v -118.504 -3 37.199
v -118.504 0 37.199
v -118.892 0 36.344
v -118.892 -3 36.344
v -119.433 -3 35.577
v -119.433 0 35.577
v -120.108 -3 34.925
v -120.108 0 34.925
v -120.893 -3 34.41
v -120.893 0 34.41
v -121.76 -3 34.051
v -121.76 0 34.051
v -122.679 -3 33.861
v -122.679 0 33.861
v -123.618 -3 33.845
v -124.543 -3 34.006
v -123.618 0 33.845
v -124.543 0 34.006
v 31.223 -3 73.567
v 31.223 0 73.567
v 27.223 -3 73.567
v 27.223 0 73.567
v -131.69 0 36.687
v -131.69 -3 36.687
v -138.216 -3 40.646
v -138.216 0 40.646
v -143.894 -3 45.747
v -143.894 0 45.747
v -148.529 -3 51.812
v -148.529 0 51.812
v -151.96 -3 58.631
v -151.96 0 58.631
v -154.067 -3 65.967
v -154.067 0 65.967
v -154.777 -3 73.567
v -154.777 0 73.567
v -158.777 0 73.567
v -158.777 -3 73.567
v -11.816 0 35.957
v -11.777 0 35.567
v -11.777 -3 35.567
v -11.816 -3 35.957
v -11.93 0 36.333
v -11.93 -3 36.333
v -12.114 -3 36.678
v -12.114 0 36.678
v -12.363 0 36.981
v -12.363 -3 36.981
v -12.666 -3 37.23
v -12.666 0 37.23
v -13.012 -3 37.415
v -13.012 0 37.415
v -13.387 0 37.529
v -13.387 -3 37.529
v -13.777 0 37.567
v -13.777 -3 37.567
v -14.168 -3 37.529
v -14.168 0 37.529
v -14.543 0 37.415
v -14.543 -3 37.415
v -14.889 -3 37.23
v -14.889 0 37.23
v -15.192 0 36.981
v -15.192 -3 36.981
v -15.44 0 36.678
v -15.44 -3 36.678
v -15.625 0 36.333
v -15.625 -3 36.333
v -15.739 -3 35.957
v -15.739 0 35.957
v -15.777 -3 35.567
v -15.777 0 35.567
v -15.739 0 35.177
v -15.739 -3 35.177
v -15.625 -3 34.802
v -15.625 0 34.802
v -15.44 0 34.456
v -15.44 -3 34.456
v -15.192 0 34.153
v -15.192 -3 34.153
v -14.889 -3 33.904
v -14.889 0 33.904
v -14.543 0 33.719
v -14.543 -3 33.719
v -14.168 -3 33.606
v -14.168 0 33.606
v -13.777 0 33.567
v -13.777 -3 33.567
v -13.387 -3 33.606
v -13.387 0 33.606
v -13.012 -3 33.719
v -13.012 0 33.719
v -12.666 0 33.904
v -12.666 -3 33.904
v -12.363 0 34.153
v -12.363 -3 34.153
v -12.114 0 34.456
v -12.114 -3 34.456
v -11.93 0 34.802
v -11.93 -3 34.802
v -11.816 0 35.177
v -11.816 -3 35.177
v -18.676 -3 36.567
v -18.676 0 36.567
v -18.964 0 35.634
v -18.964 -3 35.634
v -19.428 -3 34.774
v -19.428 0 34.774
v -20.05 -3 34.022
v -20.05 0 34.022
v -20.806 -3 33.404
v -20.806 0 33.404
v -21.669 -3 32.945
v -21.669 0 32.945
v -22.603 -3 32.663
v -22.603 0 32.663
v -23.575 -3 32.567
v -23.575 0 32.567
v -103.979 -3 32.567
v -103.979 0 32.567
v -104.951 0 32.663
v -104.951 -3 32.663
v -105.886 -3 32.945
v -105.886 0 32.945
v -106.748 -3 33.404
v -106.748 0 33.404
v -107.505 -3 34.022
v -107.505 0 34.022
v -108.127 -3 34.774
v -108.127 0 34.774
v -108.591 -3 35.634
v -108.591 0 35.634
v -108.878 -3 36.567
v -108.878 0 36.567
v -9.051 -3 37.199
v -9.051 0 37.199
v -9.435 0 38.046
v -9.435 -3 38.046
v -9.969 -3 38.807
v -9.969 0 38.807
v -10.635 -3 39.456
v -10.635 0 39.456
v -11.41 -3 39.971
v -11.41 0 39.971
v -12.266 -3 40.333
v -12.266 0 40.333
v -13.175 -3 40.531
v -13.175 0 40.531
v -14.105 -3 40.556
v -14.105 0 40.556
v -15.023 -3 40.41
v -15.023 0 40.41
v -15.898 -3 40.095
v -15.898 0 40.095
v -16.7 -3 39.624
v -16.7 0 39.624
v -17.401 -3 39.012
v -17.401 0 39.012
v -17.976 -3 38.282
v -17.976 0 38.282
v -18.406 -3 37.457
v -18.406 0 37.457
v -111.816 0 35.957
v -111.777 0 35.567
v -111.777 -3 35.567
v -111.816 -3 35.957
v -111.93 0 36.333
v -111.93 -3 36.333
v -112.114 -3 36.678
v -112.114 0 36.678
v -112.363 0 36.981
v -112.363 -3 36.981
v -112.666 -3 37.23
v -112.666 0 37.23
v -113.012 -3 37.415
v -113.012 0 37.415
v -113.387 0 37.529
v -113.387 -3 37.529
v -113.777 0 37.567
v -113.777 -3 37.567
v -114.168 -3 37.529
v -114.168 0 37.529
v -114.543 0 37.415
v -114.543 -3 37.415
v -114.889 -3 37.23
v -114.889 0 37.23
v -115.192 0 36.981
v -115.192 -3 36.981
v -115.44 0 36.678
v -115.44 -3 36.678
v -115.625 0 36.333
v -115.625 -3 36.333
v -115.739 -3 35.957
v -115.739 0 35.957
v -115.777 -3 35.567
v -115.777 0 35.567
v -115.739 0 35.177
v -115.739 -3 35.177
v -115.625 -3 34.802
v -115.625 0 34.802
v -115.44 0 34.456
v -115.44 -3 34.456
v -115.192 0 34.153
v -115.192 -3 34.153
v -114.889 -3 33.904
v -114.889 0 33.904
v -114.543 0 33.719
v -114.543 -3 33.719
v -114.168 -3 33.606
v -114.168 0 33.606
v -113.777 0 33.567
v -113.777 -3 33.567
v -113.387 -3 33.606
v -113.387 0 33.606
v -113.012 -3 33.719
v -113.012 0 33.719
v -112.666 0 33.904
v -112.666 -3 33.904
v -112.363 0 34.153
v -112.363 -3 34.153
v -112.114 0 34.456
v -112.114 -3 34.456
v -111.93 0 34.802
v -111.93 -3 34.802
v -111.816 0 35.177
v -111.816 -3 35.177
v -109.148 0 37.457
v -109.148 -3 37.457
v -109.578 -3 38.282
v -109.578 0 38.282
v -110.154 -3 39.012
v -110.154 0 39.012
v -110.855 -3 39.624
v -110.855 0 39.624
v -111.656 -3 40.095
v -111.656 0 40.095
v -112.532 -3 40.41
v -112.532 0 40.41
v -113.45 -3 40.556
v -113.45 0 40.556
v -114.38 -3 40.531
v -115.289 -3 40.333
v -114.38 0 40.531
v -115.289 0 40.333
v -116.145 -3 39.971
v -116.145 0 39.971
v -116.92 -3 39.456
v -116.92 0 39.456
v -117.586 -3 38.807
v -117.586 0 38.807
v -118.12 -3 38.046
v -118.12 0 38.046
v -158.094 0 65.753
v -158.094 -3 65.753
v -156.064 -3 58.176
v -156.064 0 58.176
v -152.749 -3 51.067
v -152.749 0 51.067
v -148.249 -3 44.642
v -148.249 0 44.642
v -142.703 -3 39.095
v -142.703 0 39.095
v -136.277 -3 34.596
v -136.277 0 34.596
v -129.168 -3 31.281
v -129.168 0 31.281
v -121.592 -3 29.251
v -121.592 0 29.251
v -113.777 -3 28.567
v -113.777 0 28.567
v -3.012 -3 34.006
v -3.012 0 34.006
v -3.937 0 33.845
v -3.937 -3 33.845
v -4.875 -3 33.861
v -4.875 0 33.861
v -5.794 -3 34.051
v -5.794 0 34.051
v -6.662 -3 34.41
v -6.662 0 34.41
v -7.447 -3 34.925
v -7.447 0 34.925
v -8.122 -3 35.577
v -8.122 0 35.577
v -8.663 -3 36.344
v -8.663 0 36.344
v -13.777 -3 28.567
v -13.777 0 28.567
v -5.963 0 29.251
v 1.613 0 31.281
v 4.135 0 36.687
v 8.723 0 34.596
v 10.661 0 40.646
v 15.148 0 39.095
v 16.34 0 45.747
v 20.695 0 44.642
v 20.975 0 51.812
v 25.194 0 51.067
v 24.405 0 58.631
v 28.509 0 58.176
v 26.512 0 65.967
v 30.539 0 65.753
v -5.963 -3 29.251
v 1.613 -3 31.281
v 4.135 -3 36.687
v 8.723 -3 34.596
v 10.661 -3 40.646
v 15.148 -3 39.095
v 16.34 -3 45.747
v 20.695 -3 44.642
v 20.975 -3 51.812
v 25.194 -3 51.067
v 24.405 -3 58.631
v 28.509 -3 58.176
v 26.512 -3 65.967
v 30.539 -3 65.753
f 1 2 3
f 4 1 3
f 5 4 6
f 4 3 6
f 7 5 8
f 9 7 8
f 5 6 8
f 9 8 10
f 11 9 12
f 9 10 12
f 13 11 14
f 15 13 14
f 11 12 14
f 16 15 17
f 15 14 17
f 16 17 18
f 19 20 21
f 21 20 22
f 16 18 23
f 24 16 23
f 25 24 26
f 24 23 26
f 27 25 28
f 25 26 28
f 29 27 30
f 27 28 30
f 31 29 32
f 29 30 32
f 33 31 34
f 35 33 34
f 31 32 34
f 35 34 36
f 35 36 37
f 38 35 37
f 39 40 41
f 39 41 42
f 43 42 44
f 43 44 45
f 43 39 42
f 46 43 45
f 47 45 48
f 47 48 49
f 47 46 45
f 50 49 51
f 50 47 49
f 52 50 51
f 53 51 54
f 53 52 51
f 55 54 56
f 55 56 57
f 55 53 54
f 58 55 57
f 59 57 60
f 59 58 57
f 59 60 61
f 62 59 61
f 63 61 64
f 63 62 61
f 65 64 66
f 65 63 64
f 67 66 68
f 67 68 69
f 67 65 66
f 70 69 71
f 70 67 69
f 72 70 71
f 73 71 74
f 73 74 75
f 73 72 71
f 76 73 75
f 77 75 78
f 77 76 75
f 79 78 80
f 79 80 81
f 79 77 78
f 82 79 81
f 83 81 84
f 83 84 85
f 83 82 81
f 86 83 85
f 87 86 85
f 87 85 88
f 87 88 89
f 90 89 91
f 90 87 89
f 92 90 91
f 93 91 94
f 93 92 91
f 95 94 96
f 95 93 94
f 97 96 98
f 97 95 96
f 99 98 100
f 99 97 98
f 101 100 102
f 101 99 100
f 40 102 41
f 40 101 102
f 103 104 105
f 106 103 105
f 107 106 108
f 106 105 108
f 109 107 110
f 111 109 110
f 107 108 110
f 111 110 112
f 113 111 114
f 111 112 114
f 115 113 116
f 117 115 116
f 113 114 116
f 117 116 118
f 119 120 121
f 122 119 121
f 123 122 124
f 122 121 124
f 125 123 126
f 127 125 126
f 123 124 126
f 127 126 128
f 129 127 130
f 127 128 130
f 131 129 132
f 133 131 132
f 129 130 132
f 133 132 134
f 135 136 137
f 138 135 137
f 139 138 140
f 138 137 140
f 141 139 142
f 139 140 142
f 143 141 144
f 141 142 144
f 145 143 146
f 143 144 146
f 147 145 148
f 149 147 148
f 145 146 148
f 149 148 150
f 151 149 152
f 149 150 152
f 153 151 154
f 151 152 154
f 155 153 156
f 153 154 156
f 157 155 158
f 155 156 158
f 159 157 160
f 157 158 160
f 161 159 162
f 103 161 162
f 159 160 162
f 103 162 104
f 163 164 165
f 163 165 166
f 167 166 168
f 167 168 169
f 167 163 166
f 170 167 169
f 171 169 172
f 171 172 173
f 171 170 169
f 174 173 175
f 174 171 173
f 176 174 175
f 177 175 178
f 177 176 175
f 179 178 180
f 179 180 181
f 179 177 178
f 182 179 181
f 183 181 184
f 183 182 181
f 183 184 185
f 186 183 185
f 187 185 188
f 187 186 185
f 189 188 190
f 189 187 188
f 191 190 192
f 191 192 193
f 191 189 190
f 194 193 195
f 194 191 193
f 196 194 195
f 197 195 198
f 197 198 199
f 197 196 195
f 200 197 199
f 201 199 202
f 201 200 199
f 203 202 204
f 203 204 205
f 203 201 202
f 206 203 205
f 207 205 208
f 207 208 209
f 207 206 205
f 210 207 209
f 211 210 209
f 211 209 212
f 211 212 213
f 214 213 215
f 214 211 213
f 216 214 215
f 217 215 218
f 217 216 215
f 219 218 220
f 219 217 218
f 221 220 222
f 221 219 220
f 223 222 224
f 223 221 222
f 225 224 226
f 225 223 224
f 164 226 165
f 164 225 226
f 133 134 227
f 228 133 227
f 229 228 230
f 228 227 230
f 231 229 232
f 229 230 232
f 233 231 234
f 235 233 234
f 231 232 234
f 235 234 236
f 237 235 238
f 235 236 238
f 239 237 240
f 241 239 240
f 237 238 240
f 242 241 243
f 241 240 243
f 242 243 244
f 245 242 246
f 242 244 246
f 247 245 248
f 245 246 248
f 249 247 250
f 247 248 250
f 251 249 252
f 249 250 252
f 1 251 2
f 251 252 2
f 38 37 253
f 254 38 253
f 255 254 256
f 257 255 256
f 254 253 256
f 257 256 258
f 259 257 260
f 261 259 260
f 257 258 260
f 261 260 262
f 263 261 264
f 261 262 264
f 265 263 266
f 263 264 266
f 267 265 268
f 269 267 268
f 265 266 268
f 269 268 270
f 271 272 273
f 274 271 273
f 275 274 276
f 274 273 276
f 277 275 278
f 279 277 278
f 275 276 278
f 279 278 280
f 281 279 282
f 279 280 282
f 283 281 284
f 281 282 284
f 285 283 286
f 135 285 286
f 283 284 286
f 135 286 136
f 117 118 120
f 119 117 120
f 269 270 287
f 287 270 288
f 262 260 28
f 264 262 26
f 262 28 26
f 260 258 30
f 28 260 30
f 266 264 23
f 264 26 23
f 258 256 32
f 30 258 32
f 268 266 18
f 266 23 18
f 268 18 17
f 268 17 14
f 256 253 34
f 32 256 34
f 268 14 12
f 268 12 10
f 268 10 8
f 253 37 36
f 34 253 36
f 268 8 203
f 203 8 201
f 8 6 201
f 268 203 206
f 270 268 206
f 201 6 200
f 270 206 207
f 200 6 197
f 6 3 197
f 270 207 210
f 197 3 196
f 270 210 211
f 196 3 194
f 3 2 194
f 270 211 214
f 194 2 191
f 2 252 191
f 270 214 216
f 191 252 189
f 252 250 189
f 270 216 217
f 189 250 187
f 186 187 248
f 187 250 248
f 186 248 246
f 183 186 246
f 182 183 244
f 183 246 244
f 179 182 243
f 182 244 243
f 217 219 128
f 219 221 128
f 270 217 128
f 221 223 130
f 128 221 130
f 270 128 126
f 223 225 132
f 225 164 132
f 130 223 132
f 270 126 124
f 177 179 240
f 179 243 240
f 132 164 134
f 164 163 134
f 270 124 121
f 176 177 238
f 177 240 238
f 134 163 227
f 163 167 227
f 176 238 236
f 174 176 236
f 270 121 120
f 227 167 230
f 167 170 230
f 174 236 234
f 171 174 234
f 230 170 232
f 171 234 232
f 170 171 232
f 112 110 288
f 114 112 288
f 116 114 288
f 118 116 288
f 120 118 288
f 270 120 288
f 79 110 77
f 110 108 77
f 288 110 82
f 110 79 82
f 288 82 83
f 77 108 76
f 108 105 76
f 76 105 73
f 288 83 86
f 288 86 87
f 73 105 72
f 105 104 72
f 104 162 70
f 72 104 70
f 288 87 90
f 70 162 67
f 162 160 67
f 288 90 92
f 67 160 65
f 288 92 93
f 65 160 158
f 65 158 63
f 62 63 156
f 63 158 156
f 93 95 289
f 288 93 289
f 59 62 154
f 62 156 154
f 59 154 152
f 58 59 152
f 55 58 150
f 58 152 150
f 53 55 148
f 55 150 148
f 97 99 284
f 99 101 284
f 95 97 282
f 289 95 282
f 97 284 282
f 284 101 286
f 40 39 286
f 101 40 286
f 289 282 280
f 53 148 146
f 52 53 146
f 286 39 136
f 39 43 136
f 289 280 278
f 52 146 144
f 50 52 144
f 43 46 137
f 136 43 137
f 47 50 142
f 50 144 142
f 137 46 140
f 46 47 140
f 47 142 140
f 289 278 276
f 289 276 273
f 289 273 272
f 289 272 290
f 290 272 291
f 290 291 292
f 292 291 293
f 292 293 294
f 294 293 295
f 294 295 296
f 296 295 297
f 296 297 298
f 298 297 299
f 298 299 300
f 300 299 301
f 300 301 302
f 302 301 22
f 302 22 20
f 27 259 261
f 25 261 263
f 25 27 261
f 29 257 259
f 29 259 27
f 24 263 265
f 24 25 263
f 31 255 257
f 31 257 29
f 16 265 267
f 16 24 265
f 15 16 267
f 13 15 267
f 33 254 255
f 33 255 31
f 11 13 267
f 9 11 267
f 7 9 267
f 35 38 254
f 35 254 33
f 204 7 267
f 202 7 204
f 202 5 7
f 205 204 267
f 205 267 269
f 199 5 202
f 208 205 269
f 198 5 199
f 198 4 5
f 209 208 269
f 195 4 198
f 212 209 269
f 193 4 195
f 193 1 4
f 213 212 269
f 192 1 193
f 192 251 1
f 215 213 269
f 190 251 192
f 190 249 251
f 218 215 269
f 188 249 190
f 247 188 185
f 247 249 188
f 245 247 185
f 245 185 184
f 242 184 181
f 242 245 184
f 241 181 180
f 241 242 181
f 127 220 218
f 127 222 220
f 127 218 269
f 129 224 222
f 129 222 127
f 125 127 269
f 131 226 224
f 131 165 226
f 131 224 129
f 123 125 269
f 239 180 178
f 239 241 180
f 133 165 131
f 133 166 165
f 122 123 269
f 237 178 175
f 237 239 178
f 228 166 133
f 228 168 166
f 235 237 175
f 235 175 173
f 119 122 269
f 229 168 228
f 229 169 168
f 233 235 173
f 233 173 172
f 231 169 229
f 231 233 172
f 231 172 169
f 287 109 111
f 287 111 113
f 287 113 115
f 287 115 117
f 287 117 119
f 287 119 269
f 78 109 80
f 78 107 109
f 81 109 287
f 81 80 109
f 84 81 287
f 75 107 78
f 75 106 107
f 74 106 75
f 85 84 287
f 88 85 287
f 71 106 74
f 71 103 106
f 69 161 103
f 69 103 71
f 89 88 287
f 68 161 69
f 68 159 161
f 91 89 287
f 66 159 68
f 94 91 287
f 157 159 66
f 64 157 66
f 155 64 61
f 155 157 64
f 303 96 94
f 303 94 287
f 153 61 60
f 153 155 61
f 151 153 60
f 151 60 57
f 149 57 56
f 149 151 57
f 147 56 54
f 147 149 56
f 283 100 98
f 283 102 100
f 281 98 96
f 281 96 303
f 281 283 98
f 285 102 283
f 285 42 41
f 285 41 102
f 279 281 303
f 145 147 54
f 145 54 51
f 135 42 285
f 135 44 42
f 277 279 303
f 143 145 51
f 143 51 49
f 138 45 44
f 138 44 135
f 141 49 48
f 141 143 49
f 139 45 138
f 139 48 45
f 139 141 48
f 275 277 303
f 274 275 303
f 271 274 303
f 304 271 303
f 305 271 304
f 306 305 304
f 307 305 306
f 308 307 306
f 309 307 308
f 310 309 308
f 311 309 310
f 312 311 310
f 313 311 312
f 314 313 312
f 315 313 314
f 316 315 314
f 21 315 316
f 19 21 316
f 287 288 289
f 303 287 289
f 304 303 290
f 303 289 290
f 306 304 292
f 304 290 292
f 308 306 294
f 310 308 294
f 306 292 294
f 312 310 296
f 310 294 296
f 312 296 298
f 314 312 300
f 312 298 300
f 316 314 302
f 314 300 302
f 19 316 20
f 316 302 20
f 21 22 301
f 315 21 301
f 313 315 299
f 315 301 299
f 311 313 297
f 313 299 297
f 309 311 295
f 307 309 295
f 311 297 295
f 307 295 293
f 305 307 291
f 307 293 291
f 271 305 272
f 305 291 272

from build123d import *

# Parameters (mm, degrees)
F0_R     = 2
F1_DEPTH = 3


with BuildPart() as f1:
    # F0 (on Front) → F1 (new body)
    with BuildSketch(Plane.XZ):
        with BuildLine():
            Line((-154.777424, 73.567189), (-158.777424, 73.567189))
            ThreePointArc((-158.777424, 73.567189), (-145.59723, 41.747384), (-113.777424, 28.567189))
            Line((-113.777424, 28.567189), (-13.777424, 28.567189))
            ThreePointArc((-13.777424, 28.567189), (18.042381, 41.747384), (31.222576, 73.567189))
            Line((31.222576, 73.567189), (27.222576, 73.567189))
            ThreePointArc((27.222576, 73.567189), (18.79852, 48.671249), (-3.011954, 34.005786))
            ThreePointArc((-3.011954, 34.005786), (-6.66184, 34.41013), (-9.05112, 37.198768))
            ThreePointArc((-9.05112, 37.198768), (-14.104804, 40.55646), (-18.676404, 36.567189))
            ThreePointArc((-18.676404, 36.567189), (-20.413106, 33.694206), (-23.575383, 32.567189))
            Line((-23.575383, 32.567189), (-103.979465, 32.567189))
            ThreePointArc((-103.979465, 32.567189), (-107.141743, 33.694206), (-108.878445, 36.567189))
            ThreePointArc((-108.878445, 36.567189), (-113.450045, 40.55646), (-118.503728, 37.198768))
            ThreePointArc((-118.503728, 37.198768), (-120.893009, 34.41013), (-124.542895, 34.005786))
            ThreePointArc((-124.542895, 34.005786), (-146.353369, 48.671249), (-154.777424, 73.567189))
        make_face()
        with Locations((-113.777424, 35.567189)):
            Circle(F0_R, mode=Mode.SUBTRACT)
        with Locations((-13.777424, 35.567189)):
            Circle(F0_R, mode=Mode.SUBTRACT)
    extrude(amount=F1_DEPTH)


solid = f1.part
